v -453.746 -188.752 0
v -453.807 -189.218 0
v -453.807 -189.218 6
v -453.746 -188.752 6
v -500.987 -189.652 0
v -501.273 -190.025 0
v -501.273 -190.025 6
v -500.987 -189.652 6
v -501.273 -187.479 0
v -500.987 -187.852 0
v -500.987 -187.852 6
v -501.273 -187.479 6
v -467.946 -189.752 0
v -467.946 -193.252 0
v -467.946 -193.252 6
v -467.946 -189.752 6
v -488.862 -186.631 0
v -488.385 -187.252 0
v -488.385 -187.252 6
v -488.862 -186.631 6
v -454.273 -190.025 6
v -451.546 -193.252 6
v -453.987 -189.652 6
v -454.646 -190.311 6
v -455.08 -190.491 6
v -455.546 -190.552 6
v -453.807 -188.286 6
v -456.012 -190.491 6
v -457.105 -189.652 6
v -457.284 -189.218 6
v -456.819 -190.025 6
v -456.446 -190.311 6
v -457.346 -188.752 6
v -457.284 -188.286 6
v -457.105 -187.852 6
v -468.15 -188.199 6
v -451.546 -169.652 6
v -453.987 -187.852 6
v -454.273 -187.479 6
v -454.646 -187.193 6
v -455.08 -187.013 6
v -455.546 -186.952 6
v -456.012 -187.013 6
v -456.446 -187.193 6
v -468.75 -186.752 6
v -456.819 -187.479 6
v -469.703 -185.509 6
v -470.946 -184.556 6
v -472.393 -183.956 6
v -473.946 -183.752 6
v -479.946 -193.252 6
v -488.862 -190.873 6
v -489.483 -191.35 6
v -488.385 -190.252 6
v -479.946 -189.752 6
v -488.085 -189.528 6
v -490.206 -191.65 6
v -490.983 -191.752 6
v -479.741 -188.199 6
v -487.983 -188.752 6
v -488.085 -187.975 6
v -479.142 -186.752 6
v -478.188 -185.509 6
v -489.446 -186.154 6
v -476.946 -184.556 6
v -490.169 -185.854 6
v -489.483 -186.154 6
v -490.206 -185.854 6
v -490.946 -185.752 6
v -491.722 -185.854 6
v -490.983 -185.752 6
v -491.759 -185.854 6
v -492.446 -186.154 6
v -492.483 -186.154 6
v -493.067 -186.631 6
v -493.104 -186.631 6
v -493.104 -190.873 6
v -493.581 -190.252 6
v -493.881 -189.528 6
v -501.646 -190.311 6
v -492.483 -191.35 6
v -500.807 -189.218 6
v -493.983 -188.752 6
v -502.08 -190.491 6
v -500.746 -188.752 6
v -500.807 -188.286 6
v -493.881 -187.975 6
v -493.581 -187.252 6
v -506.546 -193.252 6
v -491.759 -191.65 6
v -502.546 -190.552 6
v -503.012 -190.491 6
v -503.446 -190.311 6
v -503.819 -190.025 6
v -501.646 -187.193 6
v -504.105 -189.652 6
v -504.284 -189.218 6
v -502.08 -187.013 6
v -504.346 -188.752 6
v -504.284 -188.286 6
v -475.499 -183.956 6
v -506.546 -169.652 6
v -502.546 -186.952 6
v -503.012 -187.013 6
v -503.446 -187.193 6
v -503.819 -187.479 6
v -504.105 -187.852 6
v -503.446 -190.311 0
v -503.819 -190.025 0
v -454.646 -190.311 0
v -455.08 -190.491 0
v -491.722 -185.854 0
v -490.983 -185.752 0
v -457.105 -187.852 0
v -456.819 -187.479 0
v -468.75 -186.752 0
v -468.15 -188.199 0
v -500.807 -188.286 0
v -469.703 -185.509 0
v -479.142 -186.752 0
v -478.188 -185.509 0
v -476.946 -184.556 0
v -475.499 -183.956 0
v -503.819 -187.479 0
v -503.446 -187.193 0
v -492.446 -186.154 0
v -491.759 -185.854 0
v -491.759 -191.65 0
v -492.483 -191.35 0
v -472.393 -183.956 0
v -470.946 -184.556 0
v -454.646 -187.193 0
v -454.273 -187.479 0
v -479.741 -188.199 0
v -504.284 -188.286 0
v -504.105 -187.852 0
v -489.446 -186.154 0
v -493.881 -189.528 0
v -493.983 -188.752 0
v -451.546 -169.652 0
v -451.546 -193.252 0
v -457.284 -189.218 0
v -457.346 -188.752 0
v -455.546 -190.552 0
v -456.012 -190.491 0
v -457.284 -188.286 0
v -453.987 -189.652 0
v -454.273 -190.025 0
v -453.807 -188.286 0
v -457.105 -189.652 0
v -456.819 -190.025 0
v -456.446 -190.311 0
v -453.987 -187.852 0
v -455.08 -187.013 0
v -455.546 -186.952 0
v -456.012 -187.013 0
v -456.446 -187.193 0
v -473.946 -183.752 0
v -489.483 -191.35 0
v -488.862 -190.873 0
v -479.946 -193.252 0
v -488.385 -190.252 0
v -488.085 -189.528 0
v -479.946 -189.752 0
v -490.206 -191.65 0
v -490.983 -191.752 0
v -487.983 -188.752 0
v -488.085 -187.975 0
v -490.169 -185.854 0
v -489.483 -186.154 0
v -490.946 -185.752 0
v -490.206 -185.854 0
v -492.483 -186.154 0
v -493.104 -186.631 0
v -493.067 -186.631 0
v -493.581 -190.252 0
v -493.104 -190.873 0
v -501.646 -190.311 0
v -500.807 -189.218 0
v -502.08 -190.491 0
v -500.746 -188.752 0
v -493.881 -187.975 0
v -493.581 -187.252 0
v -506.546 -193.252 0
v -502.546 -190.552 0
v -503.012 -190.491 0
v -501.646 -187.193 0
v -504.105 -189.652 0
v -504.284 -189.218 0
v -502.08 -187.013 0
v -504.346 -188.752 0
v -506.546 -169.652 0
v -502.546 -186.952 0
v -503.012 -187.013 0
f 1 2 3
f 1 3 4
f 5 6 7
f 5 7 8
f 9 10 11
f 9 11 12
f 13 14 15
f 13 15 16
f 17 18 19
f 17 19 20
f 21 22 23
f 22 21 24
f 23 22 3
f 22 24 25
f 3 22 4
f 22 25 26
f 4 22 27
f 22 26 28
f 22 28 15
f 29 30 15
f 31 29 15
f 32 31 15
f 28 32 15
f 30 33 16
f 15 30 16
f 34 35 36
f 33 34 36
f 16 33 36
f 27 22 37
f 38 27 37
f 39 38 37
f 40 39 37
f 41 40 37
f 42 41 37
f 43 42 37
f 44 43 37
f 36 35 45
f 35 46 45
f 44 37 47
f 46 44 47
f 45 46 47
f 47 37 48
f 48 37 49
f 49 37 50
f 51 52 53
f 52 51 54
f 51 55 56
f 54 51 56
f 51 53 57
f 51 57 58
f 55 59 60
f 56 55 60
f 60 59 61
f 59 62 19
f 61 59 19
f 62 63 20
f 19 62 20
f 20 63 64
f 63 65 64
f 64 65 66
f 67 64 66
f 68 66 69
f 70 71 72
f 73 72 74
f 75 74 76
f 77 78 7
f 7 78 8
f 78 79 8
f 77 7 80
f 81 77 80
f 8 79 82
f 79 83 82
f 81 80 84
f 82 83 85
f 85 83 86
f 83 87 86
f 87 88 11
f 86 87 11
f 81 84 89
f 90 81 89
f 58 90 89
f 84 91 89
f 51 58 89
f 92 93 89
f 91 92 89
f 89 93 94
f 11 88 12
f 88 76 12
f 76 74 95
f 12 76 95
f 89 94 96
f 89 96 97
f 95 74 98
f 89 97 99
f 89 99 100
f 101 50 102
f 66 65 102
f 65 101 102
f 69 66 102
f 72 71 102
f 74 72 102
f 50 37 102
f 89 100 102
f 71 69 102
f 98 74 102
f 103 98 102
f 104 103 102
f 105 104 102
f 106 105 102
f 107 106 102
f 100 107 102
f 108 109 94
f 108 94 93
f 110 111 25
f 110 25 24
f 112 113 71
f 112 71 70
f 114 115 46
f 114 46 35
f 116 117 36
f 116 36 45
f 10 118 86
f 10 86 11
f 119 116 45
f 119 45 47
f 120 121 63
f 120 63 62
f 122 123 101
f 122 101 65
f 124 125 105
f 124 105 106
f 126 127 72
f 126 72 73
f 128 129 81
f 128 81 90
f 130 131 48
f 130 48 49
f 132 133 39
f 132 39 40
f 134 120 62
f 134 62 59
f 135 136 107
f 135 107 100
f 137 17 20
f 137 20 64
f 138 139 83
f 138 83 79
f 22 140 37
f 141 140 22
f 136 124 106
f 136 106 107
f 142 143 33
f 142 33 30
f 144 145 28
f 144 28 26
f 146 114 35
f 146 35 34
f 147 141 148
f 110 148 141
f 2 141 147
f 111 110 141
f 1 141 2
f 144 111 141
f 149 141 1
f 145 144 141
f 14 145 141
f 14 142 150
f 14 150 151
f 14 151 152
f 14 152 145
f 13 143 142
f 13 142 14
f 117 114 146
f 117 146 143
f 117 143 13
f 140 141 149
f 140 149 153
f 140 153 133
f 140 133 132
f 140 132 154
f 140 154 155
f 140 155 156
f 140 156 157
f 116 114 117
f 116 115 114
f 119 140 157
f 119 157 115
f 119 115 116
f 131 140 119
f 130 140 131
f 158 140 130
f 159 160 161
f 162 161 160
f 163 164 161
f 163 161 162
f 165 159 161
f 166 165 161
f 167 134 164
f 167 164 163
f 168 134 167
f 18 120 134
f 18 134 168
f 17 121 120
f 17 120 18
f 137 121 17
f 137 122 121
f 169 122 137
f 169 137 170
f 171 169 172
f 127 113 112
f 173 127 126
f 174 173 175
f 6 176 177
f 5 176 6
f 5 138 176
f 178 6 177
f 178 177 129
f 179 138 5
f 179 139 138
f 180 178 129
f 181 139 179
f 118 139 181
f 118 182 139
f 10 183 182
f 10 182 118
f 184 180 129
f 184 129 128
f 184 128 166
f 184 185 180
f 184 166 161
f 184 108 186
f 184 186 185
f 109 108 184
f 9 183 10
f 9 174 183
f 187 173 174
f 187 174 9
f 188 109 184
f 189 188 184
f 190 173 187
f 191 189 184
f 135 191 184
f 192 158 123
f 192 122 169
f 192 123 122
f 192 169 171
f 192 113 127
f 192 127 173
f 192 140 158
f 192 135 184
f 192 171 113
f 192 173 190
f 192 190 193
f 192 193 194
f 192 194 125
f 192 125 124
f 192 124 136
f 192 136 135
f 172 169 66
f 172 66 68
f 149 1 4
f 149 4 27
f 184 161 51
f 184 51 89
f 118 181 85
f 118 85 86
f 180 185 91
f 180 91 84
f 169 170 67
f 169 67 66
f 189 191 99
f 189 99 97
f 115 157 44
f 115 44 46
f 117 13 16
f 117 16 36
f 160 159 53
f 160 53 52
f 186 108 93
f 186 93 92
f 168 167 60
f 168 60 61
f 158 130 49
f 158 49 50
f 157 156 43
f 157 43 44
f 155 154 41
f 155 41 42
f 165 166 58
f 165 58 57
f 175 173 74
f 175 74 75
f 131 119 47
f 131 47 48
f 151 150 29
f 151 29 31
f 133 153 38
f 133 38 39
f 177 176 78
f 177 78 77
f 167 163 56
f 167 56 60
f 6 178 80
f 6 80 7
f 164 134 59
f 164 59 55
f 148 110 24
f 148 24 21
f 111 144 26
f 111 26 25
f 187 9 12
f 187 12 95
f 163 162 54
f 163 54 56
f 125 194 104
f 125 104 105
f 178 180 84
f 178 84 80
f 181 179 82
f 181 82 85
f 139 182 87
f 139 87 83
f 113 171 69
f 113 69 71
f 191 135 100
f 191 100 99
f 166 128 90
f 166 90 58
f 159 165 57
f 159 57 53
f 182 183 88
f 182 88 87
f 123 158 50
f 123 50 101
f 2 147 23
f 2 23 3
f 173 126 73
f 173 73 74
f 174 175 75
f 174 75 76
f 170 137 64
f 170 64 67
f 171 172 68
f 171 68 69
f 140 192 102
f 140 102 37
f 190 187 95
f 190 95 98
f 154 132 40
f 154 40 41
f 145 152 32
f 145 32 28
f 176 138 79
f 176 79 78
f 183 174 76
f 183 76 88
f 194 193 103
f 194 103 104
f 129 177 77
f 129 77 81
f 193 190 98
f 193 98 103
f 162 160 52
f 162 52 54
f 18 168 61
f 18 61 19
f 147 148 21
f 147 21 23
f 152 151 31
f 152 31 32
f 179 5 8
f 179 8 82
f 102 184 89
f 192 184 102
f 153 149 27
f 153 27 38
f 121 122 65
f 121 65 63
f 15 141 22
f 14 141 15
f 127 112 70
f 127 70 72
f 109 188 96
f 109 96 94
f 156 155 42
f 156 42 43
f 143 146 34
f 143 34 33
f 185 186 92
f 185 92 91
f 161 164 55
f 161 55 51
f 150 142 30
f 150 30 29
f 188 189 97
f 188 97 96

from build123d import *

# Parameters (mm, degrees)
BOSS_EXTRUDE1_DEPTH = 6


with BuildPart() as part:
    # Sketch1 → Boss-Extrude1 (new body)
    with BuildSketch(Plane.XY):
        Polygon((-506.545769475, -193.251863484), (-506.545769475, -169.651863484), (-451.545769475, -169.651863484), (-451.545769475, -193.251863484), (-467.945769475, -193.251863484), (-467.945769475, -189.751863484), (-468.150214517, -188.198949213), (-468.749617052, -186.751863484), (-469.703128788, -185.509222797), (-470.945769475, -184.555711061), (-472.392855205, -183.956308526), (-473.945769475, -183.751863484), (-475.498683746, -183.956308526), (-476.945769475, -184.555711061), (-478.188410162, -185.509222797), (-479.141921898, -186.751863484), (-479.741324433, -188.198949213), (-479.945769475, -189.751863484), (-479.945769475, -193.251863484), align=None)
        Polygon((-455.545769475, -190.551863484), (-455.079895194, -190.490529971), (-454.645769475, -190.310709211), (-454.272977269, -190.02465569), (-453.986923748, -189.651863484), (-453.807102988, -189.217737765), (-453.745769475, -188.751863484), (-453.807102988, -188.285989203), (-453.986923748, -187.851863484), (-454.272977269, -187.479071278), (-454.645769475, -187.193017757), (-455.079895194, -187.013196996), (-455.545769475, -186.951863484), (-456.011643756, -187.013196996), (-456.445769475, -187.193017757), (-456.818561681, -187.479071278), (-457.104615202, -187.851863484), (-457.284435962, -188.285989203), (-457.345769475, -188.751863484), (-457.284435962, -189.217737765), (-457.104615202, -189.651863484), (-456.818561681, -190.02465569), (-456.445769475, -190.310709211), (-456.011643756, -190.490529971), align=None, mode=Mode.SUBTRACT)
        Polygon((-502.079895194, -190.490529971), (-501.645769475, -190.310709211), (-501.272977269, -190.02465569), (-500.986923748, -189.651863484), (-500.807102988, -189.217737765), (-500.745769475, -188.751863484), (-500.807102988, -188.285989203), (-500.986923748, -187.851863484), (-501.272977269, -187.479071278), (-501.645769475, -187.193017757), (-502.079895194, -187.013196996), (-502.545769475, -186.951863484), (-503.011643756, -187.013196996), (-503.445769475, -187.193017757), (-503.818561681, -187.479071278), (-504.104615202, -187.851863484), (-504.284435962, -188.285989203), (-504.345769475, -188.751863484), (-504.284435962, -189.217737765), (-504.104615202, -189.651863484), (-503.818561681, -190.02465569), (-503.445769475, -190.310709211), (-503.011643756, -190.490529971), (-502.545769475, -190.551863484), align=None, mode=Mode.SUBTRACT)
        Polygon((-492.445769475, -186.153787272), (-492.482936855, -186.153787272), (-493.067089819, -186.63054314), (-493.104257199, -186.63054314), (-493.581013066, -187.251863484), (-493.880714334, -187.975406348), (-493.982936855, -188.751863484), (-493.880714334, -189.528320619), (-493.581013066, -190.251863484), (-493.104257199, -190.873183827), (-492.482936855, -191.349939695), (-491.75939399, -191.649640963), (-490.982936855, -191.751863484), (-490.20647972, -191.649640963), (-489.482936855, -191.349939695), (-488.861616511, -190.873183827), (-488.384860644, -190.251863484), (-488.085159376, -189.528320619), (-487.982936855, -188.751863484), (-488.085159376, -187.975406348), (-488.384860644, -187.251863484), (-488.861616511, -186.63054314), (-489.445769475, -186.153787272), (-489.482936855, -186.153787272), (-490.16931234, -185.854086005), (-490.20647972, -185.854086005), (-490.945769475, -185.751863484), (-490.982936855, -185.751863484), (-491.72222661, -185.854086005), (-491.75939399, -185.854086005), align=None, mode=Mode.SUBTRACT)
    extrude(amount=BOSS_EXTRUDE1_DEPTH)


solid = part.part
